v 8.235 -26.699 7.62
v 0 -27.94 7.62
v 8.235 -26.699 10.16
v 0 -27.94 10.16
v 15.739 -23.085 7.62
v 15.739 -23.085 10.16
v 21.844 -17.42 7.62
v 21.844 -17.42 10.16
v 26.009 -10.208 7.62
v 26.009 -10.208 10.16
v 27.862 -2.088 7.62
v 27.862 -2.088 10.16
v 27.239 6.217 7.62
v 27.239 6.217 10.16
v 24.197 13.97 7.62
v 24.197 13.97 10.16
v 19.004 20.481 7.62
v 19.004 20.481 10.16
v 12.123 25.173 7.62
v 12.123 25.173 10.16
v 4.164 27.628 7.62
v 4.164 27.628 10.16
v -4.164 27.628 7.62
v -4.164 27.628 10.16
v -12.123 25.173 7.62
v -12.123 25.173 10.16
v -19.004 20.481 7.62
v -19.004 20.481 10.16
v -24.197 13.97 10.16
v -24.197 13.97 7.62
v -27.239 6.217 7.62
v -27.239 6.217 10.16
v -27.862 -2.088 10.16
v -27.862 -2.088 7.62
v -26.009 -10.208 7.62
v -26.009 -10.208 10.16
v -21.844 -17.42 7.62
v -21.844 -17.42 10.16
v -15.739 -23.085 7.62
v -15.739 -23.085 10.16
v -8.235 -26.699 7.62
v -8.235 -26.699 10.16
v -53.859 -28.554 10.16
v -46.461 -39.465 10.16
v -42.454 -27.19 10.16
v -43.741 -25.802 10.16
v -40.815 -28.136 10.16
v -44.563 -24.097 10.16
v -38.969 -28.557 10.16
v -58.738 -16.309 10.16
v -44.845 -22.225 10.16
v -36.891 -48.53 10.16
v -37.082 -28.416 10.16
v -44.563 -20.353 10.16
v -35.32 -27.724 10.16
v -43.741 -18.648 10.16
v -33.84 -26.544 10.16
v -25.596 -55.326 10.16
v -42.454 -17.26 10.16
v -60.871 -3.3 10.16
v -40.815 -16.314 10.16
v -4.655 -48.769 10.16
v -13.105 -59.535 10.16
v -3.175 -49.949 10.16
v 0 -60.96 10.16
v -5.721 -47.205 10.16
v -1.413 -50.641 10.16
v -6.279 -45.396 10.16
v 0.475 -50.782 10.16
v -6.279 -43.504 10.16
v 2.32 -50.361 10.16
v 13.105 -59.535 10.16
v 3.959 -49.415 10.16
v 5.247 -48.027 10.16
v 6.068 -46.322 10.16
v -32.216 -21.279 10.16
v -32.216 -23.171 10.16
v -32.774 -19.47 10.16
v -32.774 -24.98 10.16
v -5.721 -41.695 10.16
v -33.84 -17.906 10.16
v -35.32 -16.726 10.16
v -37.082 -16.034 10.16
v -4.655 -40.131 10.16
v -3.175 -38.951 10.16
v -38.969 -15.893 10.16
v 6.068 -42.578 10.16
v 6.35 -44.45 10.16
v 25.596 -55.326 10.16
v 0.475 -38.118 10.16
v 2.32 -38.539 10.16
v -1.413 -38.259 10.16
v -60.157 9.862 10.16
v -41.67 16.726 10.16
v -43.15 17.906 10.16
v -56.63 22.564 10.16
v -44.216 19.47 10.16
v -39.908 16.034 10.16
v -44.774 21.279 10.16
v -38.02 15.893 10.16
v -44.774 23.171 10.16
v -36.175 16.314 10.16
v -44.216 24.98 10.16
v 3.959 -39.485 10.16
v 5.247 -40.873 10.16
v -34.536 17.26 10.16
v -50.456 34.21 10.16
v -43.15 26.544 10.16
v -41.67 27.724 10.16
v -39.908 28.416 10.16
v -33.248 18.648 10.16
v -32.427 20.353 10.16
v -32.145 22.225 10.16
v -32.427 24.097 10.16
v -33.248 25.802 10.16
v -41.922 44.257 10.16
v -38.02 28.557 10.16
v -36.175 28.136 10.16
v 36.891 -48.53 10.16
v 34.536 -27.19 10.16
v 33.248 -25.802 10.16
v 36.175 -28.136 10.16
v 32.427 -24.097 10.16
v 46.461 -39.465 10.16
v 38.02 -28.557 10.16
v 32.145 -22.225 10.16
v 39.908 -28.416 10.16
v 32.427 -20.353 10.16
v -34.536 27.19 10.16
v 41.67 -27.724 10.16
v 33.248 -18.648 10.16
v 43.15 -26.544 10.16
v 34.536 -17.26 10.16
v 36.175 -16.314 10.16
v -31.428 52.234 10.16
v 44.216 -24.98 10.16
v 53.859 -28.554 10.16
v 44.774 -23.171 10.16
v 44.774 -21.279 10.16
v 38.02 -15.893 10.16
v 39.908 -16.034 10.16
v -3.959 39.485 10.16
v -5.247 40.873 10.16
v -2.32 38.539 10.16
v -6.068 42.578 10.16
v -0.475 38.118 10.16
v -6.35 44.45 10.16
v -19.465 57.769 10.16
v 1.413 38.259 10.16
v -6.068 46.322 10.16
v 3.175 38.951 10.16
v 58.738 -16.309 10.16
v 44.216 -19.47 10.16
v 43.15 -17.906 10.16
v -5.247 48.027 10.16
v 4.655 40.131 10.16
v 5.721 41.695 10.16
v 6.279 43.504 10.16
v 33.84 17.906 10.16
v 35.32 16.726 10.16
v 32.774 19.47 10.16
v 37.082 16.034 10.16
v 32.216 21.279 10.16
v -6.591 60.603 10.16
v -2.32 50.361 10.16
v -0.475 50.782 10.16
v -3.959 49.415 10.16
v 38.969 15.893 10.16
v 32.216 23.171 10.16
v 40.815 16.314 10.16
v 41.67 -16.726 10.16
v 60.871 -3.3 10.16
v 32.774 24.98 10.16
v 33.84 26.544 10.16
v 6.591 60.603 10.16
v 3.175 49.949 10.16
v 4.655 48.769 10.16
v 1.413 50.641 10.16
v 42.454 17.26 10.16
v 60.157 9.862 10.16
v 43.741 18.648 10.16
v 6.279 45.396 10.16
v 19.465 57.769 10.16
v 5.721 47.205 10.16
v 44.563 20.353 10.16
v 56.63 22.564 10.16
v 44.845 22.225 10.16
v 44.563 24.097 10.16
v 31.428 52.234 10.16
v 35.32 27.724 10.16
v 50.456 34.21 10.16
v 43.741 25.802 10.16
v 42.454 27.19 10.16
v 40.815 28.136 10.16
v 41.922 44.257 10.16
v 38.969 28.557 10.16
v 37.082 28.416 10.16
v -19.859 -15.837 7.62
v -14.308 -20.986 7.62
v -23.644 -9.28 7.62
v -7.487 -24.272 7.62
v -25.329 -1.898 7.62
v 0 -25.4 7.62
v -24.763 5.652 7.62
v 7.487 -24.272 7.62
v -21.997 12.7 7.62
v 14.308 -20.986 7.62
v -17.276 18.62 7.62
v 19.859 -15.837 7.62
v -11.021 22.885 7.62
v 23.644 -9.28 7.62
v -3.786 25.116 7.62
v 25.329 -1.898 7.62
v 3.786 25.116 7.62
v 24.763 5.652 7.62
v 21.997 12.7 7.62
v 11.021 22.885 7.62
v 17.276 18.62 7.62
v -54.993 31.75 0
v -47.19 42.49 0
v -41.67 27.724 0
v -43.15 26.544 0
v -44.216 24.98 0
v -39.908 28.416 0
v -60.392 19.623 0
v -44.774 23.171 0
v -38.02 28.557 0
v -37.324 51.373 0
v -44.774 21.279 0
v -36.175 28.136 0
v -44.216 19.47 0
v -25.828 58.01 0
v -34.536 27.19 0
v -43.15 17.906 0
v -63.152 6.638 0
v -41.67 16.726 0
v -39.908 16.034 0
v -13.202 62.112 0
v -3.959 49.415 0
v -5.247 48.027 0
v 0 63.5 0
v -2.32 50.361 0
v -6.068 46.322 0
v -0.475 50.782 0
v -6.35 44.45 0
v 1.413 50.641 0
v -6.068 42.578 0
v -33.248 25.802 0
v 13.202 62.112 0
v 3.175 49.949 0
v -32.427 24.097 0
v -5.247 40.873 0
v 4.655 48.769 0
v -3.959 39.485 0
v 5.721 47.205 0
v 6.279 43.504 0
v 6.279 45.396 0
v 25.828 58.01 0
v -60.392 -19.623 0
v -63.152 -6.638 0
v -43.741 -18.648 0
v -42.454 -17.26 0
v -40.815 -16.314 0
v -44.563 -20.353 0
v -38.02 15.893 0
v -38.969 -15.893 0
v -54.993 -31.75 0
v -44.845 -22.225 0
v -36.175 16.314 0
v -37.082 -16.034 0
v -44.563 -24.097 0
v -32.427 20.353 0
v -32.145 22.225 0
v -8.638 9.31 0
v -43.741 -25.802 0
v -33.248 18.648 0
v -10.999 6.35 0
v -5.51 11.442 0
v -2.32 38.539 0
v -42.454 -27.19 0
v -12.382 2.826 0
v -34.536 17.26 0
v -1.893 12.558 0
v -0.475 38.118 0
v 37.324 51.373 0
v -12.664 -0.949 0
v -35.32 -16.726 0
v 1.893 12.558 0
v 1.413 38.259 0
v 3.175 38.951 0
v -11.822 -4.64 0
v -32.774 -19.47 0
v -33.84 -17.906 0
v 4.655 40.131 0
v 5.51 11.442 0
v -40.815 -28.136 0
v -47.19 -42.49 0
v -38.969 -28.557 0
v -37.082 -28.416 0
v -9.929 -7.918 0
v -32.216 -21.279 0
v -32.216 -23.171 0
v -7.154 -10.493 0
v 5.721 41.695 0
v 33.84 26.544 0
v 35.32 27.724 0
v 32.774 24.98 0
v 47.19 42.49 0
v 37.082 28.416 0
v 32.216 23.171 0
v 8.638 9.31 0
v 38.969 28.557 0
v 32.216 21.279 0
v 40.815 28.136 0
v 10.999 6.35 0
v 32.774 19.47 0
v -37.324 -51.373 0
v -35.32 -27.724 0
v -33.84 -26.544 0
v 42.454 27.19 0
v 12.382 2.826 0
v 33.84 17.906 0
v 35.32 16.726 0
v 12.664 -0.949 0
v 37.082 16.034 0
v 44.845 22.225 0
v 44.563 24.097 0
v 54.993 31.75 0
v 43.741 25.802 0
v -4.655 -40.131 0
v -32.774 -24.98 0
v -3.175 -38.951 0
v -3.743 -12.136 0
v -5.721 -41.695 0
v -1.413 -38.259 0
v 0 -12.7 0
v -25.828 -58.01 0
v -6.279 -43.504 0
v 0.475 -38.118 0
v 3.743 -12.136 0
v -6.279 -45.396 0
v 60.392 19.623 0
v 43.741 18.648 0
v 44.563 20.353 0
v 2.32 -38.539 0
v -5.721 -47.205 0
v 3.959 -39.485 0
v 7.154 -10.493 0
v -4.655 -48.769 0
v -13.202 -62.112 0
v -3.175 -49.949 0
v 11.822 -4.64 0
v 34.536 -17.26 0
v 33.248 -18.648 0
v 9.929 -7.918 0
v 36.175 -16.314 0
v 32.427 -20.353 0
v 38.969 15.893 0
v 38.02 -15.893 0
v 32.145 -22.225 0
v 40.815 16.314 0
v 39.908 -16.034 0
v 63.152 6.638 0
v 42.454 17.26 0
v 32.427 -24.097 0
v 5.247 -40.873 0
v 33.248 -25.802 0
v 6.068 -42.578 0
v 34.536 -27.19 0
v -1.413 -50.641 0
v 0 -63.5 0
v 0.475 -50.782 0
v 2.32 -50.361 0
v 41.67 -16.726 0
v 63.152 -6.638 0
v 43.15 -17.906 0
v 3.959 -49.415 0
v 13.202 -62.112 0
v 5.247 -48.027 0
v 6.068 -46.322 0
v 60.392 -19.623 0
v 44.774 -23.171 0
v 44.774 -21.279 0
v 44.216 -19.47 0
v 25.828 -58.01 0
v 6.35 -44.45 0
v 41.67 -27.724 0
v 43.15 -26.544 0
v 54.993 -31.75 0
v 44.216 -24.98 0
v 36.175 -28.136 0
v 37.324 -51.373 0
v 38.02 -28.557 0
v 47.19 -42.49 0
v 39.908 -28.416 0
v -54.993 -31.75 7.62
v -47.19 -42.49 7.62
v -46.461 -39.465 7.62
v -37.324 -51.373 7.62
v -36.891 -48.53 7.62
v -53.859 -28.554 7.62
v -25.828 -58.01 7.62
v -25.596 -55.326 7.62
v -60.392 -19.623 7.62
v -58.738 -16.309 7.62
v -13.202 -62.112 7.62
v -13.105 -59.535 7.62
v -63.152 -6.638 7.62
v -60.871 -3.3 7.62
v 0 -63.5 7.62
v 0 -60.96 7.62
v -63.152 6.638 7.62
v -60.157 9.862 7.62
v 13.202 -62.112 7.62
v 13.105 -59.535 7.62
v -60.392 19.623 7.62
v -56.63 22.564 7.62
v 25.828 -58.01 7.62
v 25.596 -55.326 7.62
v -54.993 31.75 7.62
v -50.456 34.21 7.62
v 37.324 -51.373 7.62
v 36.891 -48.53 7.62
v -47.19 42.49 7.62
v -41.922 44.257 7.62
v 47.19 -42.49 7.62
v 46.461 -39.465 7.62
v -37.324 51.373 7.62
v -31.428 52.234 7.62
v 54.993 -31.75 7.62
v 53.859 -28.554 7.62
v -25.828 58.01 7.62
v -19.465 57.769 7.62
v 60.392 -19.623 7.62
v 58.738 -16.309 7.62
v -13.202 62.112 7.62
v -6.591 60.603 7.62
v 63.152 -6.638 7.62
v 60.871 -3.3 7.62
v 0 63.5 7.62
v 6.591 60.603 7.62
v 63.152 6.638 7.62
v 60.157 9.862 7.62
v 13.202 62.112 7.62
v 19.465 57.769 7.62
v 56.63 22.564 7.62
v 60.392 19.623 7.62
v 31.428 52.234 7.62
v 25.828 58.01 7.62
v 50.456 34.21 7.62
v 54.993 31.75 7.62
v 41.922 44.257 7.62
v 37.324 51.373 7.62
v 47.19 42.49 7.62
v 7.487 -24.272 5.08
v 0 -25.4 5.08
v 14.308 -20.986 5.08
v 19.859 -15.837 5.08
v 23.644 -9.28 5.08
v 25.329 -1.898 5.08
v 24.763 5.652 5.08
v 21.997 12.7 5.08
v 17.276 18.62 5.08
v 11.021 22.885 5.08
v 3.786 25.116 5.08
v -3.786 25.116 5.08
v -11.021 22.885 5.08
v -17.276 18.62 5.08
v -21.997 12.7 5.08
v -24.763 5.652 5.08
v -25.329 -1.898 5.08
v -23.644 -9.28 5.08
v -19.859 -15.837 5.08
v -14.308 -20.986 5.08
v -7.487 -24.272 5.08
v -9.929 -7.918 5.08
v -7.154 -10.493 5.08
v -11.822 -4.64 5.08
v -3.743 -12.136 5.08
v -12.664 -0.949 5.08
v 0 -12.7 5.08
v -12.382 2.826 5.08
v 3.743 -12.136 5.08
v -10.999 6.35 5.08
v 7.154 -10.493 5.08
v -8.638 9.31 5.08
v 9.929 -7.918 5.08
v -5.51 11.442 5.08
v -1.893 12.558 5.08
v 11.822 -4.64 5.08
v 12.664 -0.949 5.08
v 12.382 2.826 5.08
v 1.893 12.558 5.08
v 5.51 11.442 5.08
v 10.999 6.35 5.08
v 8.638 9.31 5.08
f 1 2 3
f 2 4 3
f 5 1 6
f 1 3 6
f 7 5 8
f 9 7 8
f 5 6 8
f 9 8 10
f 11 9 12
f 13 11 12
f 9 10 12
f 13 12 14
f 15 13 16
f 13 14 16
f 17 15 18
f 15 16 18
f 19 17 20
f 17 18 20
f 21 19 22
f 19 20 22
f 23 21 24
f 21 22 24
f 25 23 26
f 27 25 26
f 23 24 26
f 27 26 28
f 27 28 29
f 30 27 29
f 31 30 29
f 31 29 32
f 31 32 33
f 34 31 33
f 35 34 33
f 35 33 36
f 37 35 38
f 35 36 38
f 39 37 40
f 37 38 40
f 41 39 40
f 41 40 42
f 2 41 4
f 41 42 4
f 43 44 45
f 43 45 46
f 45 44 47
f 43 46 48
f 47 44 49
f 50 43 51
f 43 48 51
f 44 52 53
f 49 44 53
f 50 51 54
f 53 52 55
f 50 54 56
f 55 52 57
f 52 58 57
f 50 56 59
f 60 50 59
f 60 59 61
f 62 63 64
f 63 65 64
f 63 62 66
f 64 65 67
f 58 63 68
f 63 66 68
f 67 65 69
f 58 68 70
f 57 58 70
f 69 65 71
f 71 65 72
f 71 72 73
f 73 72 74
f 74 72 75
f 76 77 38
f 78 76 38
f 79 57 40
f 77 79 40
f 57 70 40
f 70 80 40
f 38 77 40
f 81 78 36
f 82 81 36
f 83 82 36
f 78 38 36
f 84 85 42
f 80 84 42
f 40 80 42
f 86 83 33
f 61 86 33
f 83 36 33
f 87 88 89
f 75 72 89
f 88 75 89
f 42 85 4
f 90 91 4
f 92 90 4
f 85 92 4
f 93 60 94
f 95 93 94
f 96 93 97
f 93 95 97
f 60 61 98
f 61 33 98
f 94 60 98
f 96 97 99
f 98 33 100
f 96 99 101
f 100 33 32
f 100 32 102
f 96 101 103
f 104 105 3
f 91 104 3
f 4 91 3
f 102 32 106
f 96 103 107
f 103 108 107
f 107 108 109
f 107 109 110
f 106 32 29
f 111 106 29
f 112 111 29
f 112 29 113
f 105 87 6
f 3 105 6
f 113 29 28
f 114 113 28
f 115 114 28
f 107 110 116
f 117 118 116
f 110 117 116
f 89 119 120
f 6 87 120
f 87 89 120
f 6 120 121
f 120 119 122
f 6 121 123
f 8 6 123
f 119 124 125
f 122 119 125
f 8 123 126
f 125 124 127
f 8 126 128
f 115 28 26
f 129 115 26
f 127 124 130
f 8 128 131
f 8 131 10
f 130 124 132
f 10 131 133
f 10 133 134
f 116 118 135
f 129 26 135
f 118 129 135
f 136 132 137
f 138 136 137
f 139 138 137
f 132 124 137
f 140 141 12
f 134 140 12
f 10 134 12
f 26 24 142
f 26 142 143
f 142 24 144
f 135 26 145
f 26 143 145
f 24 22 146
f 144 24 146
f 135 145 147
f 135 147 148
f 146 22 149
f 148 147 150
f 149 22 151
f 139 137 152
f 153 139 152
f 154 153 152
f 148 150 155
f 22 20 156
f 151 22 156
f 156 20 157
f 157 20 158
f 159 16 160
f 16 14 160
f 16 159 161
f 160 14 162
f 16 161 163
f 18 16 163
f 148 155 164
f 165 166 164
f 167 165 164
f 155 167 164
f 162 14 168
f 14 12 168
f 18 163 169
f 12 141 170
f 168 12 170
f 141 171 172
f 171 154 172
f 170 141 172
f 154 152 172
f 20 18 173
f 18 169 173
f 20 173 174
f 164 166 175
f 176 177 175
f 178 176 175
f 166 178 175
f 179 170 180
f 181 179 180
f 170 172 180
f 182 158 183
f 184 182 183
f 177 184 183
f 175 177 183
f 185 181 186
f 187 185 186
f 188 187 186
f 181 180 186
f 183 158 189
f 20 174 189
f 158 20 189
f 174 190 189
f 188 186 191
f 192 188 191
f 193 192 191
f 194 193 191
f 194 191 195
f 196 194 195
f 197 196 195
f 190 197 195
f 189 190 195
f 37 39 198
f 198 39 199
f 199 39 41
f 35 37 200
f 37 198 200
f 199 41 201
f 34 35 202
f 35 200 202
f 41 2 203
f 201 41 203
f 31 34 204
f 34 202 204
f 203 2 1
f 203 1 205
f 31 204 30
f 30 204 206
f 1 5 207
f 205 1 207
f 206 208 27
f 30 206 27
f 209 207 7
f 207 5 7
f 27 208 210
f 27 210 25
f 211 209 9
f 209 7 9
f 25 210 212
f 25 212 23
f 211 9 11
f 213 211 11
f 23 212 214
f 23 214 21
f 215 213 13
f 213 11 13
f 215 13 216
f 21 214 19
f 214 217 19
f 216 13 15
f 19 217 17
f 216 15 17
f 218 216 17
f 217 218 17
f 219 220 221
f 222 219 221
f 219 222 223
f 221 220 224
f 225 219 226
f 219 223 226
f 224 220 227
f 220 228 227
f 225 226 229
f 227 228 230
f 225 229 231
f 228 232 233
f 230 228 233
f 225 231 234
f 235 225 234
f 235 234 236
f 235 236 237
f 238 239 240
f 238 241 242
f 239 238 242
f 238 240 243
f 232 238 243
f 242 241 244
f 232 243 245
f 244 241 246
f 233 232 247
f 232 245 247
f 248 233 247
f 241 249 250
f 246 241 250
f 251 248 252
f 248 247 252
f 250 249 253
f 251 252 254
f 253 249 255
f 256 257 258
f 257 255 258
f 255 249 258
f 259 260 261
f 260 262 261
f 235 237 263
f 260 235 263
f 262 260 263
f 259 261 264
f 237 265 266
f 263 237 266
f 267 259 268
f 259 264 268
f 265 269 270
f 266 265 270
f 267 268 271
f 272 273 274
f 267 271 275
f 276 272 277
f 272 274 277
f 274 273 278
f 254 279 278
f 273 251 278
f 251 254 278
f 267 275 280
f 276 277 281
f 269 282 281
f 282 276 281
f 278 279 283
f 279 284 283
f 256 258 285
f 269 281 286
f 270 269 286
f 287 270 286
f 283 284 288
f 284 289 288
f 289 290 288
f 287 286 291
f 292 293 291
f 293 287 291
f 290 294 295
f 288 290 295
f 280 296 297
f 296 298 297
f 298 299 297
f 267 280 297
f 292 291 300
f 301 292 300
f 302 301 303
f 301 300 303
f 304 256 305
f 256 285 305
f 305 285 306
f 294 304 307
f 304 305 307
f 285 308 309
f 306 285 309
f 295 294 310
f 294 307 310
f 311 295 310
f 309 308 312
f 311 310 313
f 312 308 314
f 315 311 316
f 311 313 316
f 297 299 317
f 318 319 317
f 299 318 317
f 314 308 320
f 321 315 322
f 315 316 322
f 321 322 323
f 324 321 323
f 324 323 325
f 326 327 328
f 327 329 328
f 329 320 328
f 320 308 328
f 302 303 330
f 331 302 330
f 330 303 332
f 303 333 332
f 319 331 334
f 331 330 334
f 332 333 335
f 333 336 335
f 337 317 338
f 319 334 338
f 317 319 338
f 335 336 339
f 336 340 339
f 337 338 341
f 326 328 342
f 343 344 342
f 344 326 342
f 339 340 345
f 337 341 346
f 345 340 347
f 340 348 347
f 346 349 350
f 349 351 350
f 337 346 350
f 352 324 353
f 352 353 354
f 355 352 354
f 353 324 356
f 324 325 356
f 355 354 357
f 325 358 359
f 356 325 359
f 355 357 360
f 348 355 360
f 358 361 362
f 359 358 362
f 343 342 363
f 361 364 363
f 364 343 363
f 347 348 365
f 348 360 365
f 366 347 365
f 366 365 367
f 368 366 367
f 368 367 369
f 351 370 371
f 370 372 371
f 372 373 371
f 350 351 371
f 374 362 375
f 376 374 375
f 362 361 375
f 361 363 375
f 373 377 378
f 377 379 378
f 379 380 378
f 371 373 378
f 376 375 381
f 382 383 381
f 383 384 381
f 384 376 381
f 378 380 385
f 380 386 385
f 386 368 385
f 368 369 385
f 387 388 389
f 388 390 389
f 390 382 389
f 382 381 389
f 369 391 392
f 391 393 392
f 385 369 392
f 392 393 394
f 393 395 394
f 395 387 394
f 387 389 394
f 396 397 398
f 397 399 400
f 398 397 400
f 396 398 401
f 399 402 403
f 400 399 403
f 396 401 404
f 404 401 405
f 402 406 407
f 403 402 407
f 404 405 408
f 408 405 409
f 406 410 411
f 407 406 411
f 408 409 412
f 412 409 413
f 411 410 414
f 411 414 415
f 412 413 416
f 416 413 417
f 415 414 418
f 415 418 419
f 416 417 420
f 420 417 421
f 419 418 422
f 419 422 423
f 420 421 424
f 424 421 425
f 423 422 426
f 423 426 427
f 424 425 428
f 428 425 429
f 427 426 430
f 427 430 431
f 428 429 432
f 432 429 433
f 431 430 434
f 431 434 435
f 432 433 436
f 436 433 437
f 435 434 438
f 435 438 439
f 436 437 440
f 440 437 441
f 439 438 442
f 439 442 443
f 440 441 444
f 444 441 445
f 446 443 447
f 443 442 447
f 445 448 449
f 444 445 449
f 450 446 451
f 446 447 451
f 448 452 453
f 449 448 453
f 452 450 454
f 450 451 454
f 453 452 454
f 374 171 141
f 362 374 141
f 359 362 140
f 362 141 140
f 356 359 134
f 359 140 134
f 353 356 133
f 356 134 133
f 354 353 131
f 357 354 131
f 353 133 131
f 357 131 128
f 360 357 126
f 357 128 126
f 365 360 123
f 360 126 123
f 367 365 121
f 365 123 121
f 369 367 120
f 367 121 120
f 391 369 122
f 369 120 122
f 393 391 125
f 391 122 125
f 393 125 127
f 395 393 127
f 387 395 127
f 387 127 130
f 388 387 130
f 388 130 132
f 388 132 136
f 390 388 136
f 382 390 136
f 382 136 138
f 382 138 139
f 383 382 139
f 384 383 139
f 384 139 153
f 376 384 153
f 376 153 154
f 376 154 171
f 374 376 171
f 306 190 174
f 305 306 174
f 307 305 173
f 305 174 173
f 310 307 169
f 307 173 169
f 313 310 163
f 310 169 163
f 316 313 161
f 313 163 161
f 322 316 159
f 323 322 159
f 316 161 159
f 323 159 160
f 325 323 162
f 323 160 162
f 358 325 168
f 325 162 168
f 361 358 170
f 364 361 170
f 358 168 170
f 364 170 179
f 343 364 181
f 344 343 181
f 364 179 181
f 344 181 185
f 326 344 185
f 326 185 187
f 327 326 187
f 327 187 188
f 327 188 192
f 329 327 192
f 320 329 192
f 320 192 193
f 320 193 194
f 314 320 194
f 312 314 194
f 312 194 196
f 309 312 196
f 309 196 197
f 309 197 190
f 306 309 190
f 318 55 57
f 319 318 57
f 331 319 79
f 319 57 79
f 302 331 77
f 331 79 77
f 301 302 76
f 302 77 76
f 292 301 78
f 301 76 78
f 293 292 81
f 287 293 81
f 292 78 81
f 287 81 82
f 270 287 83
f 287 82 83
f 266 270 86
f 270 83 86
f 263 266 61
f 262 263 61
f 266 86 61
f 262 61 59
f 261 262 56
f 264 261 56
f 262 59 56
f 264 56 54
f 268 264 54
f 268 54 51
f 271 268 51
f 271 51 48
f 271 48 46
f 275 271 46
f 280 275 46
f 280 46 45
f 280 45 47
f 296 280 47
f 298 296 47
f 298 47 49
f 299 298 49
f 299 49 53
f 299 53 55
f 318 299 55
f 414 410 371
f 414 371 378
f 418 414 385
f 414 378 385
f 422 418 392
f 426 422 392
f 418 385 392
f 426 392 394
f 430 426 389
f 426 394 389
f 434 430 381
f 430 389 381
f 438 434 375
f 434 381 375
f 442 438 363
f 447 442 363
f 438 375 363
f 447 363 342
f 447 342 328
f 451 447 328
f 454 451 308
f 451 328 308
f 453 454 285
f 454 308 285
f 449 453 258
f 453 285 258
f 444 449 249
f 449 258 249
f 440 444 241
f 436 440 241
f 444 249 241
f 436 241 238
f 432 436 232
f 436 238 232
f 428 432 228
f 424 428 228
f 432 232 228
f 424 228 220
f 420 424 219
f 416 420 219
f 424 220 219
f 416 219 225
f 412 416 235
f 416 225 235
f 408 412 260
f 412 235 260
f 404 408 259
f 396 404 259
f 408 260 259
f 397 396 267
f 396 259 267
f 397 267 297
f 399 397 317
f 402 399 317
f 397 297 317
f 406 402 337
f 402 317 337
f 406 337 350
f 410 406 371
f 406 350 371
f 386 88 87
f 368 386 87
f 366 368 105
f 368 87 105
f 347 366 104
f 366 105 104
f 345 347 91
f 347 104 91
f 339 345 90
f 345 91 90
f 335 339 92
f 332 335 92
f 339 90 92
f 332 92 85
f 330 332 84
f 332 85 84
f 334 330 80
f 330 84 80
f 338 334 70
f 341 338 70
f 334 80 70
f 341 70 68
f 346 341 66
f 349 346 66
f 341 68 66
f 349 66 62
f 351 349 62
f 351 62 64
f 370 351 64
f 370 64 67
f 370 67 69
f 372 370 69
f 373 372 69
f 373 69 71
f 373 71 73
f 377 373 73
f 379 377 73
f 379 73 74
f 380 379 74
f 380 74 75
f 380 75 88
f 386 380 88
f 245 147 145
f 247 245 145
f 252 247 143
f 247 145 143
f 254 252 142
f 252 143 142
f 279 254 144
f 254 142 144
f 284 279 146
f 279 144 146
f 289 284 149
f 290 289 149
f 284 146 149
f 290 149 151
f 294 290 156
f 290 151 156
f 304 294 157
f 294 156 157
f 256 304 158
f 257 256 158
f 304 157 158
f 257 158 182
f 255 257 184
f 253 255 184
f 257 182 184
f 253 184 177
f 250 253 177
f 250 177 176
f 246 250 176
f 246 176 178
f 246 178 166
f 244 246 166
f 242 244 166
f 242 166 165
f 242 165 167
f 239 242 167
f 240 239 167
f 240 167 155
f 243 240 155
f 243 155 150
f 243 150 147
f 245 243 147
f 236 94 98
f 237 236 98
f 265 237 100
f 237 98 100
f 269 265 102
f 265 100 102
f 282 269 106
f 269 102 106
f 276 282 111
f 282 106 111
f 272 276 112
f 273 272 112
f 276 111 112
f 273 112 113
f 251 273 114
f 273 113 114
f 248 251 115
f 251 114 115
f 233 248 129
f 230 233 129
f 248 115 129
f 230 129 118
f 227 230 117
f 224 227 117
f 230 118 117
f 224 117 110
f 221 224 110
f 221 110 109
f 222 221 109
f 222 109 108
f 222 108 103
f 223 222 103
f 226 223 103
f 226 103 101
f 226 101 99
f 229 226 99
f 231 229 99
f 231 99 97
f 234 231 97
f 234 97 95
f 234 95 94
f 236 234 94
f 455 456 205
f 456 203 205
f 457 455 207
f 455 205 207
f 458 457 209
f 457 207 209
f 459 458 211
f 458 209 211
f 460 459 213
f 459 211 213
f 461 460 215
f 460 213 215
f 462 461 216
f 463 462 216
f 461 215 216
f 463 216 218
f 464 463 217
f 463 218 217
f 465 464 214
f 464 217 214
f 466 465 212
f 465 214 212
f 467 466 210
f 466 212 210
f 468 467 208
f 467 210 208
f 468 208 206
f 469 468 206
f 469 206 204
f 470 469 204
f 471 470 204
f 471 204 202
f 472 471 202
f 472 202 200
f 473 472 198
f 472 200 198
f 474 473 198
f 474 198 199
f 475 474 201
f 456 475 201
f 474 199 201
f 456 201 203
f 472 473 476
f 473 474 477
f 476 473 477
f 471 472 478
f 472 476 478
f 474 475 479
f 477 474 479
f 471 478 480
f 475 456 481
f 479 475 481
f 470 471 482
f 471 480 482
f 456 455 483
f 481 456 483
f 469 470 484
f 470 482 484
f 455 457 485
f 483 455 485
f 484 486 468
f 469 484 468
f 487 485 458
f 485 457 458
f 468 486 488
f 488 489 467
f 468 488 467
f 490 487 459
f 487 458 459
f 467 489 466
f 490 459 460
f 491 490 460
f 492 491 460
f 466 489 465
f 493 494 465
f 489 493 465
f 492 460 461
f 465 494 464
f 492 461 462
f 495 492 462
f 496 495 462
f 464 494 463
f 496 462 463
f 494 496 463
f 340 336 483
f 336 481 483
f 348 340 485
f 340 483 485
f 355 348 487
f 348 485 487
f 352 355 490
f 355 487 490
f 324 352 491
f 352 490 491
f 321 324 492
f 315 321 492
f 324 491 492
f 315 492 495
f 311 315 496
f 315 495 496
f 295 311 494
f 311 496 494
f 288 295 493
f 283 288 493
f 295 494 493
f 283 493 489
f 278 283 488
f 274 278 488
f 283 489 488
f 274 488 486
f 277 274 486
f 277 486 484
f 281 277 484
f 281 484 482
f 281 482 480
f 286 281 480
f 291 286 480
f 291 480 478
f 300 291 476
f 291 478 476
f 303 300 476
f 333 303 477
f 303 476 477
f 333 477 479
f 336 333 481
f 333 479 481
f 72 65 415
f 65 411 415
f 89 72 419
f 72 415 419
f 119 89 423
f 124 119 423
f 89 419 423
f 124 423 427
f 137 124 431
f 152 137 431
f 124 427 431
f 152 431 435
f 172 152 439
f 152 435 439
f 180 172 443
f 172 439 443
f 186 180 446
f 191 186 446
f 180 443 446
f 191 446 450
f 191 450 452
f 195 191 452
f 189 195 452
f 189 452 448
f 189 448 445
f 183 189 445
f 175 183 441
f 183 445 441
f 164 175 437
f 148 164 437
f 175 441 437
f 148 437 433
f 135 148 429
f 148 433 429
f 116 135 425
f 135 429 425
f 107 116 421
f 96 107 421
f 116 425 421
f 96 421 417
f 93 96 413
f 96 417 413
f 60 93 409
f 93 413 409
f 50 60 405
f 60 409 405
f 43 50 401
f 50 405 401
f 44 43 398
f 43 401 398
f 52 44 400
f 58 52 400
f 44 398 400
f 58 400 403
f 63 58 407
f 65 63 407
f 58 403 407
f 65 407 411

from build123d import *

# Parameters (mm, degrees)
F2_R     = 6.35
F3_DEPTH = 10.161
F4_COUNT = 6


with BuildPart() as f1:
    # F0 (on Right) → F1 (revolve)
    with BuildSketch(Plane.YZ):
        Polygon((-63.5, 0), (-12.7, 0), (-12.7, 5.08), (-25.4, 5.08), (-25.4, 7.62), (-27.94, 7.62), (-27.94, 10.16), (-60.96, 10.16), (-60.96, 7.62), (-63.5, 7.62), align=None)
    revolve(axis=Axis((0, 0, 21.0262340249), (0, 0, 1)))

    # F2 (on face) → F3 (cut, through all)
    with BuildSketch(Plane.XY.offset(10.16)):
        with Locations((0, -44.45)):
            Circle(F2_R)
    f3 = extrude(amount=-F3_DEPTH, mode=Mode.SUBTRACT)

    # F4: F3 ×6 about axis
    f4_axis = Axis((0, 0, 10.16), (0, 0, 1))
    for i in range(1, F4_COUNT):
        add(f3.rotate(f4_axis, i * 360 / F4_COUNT), mode=Mode.SUBTRACT)


solid = f1.part
